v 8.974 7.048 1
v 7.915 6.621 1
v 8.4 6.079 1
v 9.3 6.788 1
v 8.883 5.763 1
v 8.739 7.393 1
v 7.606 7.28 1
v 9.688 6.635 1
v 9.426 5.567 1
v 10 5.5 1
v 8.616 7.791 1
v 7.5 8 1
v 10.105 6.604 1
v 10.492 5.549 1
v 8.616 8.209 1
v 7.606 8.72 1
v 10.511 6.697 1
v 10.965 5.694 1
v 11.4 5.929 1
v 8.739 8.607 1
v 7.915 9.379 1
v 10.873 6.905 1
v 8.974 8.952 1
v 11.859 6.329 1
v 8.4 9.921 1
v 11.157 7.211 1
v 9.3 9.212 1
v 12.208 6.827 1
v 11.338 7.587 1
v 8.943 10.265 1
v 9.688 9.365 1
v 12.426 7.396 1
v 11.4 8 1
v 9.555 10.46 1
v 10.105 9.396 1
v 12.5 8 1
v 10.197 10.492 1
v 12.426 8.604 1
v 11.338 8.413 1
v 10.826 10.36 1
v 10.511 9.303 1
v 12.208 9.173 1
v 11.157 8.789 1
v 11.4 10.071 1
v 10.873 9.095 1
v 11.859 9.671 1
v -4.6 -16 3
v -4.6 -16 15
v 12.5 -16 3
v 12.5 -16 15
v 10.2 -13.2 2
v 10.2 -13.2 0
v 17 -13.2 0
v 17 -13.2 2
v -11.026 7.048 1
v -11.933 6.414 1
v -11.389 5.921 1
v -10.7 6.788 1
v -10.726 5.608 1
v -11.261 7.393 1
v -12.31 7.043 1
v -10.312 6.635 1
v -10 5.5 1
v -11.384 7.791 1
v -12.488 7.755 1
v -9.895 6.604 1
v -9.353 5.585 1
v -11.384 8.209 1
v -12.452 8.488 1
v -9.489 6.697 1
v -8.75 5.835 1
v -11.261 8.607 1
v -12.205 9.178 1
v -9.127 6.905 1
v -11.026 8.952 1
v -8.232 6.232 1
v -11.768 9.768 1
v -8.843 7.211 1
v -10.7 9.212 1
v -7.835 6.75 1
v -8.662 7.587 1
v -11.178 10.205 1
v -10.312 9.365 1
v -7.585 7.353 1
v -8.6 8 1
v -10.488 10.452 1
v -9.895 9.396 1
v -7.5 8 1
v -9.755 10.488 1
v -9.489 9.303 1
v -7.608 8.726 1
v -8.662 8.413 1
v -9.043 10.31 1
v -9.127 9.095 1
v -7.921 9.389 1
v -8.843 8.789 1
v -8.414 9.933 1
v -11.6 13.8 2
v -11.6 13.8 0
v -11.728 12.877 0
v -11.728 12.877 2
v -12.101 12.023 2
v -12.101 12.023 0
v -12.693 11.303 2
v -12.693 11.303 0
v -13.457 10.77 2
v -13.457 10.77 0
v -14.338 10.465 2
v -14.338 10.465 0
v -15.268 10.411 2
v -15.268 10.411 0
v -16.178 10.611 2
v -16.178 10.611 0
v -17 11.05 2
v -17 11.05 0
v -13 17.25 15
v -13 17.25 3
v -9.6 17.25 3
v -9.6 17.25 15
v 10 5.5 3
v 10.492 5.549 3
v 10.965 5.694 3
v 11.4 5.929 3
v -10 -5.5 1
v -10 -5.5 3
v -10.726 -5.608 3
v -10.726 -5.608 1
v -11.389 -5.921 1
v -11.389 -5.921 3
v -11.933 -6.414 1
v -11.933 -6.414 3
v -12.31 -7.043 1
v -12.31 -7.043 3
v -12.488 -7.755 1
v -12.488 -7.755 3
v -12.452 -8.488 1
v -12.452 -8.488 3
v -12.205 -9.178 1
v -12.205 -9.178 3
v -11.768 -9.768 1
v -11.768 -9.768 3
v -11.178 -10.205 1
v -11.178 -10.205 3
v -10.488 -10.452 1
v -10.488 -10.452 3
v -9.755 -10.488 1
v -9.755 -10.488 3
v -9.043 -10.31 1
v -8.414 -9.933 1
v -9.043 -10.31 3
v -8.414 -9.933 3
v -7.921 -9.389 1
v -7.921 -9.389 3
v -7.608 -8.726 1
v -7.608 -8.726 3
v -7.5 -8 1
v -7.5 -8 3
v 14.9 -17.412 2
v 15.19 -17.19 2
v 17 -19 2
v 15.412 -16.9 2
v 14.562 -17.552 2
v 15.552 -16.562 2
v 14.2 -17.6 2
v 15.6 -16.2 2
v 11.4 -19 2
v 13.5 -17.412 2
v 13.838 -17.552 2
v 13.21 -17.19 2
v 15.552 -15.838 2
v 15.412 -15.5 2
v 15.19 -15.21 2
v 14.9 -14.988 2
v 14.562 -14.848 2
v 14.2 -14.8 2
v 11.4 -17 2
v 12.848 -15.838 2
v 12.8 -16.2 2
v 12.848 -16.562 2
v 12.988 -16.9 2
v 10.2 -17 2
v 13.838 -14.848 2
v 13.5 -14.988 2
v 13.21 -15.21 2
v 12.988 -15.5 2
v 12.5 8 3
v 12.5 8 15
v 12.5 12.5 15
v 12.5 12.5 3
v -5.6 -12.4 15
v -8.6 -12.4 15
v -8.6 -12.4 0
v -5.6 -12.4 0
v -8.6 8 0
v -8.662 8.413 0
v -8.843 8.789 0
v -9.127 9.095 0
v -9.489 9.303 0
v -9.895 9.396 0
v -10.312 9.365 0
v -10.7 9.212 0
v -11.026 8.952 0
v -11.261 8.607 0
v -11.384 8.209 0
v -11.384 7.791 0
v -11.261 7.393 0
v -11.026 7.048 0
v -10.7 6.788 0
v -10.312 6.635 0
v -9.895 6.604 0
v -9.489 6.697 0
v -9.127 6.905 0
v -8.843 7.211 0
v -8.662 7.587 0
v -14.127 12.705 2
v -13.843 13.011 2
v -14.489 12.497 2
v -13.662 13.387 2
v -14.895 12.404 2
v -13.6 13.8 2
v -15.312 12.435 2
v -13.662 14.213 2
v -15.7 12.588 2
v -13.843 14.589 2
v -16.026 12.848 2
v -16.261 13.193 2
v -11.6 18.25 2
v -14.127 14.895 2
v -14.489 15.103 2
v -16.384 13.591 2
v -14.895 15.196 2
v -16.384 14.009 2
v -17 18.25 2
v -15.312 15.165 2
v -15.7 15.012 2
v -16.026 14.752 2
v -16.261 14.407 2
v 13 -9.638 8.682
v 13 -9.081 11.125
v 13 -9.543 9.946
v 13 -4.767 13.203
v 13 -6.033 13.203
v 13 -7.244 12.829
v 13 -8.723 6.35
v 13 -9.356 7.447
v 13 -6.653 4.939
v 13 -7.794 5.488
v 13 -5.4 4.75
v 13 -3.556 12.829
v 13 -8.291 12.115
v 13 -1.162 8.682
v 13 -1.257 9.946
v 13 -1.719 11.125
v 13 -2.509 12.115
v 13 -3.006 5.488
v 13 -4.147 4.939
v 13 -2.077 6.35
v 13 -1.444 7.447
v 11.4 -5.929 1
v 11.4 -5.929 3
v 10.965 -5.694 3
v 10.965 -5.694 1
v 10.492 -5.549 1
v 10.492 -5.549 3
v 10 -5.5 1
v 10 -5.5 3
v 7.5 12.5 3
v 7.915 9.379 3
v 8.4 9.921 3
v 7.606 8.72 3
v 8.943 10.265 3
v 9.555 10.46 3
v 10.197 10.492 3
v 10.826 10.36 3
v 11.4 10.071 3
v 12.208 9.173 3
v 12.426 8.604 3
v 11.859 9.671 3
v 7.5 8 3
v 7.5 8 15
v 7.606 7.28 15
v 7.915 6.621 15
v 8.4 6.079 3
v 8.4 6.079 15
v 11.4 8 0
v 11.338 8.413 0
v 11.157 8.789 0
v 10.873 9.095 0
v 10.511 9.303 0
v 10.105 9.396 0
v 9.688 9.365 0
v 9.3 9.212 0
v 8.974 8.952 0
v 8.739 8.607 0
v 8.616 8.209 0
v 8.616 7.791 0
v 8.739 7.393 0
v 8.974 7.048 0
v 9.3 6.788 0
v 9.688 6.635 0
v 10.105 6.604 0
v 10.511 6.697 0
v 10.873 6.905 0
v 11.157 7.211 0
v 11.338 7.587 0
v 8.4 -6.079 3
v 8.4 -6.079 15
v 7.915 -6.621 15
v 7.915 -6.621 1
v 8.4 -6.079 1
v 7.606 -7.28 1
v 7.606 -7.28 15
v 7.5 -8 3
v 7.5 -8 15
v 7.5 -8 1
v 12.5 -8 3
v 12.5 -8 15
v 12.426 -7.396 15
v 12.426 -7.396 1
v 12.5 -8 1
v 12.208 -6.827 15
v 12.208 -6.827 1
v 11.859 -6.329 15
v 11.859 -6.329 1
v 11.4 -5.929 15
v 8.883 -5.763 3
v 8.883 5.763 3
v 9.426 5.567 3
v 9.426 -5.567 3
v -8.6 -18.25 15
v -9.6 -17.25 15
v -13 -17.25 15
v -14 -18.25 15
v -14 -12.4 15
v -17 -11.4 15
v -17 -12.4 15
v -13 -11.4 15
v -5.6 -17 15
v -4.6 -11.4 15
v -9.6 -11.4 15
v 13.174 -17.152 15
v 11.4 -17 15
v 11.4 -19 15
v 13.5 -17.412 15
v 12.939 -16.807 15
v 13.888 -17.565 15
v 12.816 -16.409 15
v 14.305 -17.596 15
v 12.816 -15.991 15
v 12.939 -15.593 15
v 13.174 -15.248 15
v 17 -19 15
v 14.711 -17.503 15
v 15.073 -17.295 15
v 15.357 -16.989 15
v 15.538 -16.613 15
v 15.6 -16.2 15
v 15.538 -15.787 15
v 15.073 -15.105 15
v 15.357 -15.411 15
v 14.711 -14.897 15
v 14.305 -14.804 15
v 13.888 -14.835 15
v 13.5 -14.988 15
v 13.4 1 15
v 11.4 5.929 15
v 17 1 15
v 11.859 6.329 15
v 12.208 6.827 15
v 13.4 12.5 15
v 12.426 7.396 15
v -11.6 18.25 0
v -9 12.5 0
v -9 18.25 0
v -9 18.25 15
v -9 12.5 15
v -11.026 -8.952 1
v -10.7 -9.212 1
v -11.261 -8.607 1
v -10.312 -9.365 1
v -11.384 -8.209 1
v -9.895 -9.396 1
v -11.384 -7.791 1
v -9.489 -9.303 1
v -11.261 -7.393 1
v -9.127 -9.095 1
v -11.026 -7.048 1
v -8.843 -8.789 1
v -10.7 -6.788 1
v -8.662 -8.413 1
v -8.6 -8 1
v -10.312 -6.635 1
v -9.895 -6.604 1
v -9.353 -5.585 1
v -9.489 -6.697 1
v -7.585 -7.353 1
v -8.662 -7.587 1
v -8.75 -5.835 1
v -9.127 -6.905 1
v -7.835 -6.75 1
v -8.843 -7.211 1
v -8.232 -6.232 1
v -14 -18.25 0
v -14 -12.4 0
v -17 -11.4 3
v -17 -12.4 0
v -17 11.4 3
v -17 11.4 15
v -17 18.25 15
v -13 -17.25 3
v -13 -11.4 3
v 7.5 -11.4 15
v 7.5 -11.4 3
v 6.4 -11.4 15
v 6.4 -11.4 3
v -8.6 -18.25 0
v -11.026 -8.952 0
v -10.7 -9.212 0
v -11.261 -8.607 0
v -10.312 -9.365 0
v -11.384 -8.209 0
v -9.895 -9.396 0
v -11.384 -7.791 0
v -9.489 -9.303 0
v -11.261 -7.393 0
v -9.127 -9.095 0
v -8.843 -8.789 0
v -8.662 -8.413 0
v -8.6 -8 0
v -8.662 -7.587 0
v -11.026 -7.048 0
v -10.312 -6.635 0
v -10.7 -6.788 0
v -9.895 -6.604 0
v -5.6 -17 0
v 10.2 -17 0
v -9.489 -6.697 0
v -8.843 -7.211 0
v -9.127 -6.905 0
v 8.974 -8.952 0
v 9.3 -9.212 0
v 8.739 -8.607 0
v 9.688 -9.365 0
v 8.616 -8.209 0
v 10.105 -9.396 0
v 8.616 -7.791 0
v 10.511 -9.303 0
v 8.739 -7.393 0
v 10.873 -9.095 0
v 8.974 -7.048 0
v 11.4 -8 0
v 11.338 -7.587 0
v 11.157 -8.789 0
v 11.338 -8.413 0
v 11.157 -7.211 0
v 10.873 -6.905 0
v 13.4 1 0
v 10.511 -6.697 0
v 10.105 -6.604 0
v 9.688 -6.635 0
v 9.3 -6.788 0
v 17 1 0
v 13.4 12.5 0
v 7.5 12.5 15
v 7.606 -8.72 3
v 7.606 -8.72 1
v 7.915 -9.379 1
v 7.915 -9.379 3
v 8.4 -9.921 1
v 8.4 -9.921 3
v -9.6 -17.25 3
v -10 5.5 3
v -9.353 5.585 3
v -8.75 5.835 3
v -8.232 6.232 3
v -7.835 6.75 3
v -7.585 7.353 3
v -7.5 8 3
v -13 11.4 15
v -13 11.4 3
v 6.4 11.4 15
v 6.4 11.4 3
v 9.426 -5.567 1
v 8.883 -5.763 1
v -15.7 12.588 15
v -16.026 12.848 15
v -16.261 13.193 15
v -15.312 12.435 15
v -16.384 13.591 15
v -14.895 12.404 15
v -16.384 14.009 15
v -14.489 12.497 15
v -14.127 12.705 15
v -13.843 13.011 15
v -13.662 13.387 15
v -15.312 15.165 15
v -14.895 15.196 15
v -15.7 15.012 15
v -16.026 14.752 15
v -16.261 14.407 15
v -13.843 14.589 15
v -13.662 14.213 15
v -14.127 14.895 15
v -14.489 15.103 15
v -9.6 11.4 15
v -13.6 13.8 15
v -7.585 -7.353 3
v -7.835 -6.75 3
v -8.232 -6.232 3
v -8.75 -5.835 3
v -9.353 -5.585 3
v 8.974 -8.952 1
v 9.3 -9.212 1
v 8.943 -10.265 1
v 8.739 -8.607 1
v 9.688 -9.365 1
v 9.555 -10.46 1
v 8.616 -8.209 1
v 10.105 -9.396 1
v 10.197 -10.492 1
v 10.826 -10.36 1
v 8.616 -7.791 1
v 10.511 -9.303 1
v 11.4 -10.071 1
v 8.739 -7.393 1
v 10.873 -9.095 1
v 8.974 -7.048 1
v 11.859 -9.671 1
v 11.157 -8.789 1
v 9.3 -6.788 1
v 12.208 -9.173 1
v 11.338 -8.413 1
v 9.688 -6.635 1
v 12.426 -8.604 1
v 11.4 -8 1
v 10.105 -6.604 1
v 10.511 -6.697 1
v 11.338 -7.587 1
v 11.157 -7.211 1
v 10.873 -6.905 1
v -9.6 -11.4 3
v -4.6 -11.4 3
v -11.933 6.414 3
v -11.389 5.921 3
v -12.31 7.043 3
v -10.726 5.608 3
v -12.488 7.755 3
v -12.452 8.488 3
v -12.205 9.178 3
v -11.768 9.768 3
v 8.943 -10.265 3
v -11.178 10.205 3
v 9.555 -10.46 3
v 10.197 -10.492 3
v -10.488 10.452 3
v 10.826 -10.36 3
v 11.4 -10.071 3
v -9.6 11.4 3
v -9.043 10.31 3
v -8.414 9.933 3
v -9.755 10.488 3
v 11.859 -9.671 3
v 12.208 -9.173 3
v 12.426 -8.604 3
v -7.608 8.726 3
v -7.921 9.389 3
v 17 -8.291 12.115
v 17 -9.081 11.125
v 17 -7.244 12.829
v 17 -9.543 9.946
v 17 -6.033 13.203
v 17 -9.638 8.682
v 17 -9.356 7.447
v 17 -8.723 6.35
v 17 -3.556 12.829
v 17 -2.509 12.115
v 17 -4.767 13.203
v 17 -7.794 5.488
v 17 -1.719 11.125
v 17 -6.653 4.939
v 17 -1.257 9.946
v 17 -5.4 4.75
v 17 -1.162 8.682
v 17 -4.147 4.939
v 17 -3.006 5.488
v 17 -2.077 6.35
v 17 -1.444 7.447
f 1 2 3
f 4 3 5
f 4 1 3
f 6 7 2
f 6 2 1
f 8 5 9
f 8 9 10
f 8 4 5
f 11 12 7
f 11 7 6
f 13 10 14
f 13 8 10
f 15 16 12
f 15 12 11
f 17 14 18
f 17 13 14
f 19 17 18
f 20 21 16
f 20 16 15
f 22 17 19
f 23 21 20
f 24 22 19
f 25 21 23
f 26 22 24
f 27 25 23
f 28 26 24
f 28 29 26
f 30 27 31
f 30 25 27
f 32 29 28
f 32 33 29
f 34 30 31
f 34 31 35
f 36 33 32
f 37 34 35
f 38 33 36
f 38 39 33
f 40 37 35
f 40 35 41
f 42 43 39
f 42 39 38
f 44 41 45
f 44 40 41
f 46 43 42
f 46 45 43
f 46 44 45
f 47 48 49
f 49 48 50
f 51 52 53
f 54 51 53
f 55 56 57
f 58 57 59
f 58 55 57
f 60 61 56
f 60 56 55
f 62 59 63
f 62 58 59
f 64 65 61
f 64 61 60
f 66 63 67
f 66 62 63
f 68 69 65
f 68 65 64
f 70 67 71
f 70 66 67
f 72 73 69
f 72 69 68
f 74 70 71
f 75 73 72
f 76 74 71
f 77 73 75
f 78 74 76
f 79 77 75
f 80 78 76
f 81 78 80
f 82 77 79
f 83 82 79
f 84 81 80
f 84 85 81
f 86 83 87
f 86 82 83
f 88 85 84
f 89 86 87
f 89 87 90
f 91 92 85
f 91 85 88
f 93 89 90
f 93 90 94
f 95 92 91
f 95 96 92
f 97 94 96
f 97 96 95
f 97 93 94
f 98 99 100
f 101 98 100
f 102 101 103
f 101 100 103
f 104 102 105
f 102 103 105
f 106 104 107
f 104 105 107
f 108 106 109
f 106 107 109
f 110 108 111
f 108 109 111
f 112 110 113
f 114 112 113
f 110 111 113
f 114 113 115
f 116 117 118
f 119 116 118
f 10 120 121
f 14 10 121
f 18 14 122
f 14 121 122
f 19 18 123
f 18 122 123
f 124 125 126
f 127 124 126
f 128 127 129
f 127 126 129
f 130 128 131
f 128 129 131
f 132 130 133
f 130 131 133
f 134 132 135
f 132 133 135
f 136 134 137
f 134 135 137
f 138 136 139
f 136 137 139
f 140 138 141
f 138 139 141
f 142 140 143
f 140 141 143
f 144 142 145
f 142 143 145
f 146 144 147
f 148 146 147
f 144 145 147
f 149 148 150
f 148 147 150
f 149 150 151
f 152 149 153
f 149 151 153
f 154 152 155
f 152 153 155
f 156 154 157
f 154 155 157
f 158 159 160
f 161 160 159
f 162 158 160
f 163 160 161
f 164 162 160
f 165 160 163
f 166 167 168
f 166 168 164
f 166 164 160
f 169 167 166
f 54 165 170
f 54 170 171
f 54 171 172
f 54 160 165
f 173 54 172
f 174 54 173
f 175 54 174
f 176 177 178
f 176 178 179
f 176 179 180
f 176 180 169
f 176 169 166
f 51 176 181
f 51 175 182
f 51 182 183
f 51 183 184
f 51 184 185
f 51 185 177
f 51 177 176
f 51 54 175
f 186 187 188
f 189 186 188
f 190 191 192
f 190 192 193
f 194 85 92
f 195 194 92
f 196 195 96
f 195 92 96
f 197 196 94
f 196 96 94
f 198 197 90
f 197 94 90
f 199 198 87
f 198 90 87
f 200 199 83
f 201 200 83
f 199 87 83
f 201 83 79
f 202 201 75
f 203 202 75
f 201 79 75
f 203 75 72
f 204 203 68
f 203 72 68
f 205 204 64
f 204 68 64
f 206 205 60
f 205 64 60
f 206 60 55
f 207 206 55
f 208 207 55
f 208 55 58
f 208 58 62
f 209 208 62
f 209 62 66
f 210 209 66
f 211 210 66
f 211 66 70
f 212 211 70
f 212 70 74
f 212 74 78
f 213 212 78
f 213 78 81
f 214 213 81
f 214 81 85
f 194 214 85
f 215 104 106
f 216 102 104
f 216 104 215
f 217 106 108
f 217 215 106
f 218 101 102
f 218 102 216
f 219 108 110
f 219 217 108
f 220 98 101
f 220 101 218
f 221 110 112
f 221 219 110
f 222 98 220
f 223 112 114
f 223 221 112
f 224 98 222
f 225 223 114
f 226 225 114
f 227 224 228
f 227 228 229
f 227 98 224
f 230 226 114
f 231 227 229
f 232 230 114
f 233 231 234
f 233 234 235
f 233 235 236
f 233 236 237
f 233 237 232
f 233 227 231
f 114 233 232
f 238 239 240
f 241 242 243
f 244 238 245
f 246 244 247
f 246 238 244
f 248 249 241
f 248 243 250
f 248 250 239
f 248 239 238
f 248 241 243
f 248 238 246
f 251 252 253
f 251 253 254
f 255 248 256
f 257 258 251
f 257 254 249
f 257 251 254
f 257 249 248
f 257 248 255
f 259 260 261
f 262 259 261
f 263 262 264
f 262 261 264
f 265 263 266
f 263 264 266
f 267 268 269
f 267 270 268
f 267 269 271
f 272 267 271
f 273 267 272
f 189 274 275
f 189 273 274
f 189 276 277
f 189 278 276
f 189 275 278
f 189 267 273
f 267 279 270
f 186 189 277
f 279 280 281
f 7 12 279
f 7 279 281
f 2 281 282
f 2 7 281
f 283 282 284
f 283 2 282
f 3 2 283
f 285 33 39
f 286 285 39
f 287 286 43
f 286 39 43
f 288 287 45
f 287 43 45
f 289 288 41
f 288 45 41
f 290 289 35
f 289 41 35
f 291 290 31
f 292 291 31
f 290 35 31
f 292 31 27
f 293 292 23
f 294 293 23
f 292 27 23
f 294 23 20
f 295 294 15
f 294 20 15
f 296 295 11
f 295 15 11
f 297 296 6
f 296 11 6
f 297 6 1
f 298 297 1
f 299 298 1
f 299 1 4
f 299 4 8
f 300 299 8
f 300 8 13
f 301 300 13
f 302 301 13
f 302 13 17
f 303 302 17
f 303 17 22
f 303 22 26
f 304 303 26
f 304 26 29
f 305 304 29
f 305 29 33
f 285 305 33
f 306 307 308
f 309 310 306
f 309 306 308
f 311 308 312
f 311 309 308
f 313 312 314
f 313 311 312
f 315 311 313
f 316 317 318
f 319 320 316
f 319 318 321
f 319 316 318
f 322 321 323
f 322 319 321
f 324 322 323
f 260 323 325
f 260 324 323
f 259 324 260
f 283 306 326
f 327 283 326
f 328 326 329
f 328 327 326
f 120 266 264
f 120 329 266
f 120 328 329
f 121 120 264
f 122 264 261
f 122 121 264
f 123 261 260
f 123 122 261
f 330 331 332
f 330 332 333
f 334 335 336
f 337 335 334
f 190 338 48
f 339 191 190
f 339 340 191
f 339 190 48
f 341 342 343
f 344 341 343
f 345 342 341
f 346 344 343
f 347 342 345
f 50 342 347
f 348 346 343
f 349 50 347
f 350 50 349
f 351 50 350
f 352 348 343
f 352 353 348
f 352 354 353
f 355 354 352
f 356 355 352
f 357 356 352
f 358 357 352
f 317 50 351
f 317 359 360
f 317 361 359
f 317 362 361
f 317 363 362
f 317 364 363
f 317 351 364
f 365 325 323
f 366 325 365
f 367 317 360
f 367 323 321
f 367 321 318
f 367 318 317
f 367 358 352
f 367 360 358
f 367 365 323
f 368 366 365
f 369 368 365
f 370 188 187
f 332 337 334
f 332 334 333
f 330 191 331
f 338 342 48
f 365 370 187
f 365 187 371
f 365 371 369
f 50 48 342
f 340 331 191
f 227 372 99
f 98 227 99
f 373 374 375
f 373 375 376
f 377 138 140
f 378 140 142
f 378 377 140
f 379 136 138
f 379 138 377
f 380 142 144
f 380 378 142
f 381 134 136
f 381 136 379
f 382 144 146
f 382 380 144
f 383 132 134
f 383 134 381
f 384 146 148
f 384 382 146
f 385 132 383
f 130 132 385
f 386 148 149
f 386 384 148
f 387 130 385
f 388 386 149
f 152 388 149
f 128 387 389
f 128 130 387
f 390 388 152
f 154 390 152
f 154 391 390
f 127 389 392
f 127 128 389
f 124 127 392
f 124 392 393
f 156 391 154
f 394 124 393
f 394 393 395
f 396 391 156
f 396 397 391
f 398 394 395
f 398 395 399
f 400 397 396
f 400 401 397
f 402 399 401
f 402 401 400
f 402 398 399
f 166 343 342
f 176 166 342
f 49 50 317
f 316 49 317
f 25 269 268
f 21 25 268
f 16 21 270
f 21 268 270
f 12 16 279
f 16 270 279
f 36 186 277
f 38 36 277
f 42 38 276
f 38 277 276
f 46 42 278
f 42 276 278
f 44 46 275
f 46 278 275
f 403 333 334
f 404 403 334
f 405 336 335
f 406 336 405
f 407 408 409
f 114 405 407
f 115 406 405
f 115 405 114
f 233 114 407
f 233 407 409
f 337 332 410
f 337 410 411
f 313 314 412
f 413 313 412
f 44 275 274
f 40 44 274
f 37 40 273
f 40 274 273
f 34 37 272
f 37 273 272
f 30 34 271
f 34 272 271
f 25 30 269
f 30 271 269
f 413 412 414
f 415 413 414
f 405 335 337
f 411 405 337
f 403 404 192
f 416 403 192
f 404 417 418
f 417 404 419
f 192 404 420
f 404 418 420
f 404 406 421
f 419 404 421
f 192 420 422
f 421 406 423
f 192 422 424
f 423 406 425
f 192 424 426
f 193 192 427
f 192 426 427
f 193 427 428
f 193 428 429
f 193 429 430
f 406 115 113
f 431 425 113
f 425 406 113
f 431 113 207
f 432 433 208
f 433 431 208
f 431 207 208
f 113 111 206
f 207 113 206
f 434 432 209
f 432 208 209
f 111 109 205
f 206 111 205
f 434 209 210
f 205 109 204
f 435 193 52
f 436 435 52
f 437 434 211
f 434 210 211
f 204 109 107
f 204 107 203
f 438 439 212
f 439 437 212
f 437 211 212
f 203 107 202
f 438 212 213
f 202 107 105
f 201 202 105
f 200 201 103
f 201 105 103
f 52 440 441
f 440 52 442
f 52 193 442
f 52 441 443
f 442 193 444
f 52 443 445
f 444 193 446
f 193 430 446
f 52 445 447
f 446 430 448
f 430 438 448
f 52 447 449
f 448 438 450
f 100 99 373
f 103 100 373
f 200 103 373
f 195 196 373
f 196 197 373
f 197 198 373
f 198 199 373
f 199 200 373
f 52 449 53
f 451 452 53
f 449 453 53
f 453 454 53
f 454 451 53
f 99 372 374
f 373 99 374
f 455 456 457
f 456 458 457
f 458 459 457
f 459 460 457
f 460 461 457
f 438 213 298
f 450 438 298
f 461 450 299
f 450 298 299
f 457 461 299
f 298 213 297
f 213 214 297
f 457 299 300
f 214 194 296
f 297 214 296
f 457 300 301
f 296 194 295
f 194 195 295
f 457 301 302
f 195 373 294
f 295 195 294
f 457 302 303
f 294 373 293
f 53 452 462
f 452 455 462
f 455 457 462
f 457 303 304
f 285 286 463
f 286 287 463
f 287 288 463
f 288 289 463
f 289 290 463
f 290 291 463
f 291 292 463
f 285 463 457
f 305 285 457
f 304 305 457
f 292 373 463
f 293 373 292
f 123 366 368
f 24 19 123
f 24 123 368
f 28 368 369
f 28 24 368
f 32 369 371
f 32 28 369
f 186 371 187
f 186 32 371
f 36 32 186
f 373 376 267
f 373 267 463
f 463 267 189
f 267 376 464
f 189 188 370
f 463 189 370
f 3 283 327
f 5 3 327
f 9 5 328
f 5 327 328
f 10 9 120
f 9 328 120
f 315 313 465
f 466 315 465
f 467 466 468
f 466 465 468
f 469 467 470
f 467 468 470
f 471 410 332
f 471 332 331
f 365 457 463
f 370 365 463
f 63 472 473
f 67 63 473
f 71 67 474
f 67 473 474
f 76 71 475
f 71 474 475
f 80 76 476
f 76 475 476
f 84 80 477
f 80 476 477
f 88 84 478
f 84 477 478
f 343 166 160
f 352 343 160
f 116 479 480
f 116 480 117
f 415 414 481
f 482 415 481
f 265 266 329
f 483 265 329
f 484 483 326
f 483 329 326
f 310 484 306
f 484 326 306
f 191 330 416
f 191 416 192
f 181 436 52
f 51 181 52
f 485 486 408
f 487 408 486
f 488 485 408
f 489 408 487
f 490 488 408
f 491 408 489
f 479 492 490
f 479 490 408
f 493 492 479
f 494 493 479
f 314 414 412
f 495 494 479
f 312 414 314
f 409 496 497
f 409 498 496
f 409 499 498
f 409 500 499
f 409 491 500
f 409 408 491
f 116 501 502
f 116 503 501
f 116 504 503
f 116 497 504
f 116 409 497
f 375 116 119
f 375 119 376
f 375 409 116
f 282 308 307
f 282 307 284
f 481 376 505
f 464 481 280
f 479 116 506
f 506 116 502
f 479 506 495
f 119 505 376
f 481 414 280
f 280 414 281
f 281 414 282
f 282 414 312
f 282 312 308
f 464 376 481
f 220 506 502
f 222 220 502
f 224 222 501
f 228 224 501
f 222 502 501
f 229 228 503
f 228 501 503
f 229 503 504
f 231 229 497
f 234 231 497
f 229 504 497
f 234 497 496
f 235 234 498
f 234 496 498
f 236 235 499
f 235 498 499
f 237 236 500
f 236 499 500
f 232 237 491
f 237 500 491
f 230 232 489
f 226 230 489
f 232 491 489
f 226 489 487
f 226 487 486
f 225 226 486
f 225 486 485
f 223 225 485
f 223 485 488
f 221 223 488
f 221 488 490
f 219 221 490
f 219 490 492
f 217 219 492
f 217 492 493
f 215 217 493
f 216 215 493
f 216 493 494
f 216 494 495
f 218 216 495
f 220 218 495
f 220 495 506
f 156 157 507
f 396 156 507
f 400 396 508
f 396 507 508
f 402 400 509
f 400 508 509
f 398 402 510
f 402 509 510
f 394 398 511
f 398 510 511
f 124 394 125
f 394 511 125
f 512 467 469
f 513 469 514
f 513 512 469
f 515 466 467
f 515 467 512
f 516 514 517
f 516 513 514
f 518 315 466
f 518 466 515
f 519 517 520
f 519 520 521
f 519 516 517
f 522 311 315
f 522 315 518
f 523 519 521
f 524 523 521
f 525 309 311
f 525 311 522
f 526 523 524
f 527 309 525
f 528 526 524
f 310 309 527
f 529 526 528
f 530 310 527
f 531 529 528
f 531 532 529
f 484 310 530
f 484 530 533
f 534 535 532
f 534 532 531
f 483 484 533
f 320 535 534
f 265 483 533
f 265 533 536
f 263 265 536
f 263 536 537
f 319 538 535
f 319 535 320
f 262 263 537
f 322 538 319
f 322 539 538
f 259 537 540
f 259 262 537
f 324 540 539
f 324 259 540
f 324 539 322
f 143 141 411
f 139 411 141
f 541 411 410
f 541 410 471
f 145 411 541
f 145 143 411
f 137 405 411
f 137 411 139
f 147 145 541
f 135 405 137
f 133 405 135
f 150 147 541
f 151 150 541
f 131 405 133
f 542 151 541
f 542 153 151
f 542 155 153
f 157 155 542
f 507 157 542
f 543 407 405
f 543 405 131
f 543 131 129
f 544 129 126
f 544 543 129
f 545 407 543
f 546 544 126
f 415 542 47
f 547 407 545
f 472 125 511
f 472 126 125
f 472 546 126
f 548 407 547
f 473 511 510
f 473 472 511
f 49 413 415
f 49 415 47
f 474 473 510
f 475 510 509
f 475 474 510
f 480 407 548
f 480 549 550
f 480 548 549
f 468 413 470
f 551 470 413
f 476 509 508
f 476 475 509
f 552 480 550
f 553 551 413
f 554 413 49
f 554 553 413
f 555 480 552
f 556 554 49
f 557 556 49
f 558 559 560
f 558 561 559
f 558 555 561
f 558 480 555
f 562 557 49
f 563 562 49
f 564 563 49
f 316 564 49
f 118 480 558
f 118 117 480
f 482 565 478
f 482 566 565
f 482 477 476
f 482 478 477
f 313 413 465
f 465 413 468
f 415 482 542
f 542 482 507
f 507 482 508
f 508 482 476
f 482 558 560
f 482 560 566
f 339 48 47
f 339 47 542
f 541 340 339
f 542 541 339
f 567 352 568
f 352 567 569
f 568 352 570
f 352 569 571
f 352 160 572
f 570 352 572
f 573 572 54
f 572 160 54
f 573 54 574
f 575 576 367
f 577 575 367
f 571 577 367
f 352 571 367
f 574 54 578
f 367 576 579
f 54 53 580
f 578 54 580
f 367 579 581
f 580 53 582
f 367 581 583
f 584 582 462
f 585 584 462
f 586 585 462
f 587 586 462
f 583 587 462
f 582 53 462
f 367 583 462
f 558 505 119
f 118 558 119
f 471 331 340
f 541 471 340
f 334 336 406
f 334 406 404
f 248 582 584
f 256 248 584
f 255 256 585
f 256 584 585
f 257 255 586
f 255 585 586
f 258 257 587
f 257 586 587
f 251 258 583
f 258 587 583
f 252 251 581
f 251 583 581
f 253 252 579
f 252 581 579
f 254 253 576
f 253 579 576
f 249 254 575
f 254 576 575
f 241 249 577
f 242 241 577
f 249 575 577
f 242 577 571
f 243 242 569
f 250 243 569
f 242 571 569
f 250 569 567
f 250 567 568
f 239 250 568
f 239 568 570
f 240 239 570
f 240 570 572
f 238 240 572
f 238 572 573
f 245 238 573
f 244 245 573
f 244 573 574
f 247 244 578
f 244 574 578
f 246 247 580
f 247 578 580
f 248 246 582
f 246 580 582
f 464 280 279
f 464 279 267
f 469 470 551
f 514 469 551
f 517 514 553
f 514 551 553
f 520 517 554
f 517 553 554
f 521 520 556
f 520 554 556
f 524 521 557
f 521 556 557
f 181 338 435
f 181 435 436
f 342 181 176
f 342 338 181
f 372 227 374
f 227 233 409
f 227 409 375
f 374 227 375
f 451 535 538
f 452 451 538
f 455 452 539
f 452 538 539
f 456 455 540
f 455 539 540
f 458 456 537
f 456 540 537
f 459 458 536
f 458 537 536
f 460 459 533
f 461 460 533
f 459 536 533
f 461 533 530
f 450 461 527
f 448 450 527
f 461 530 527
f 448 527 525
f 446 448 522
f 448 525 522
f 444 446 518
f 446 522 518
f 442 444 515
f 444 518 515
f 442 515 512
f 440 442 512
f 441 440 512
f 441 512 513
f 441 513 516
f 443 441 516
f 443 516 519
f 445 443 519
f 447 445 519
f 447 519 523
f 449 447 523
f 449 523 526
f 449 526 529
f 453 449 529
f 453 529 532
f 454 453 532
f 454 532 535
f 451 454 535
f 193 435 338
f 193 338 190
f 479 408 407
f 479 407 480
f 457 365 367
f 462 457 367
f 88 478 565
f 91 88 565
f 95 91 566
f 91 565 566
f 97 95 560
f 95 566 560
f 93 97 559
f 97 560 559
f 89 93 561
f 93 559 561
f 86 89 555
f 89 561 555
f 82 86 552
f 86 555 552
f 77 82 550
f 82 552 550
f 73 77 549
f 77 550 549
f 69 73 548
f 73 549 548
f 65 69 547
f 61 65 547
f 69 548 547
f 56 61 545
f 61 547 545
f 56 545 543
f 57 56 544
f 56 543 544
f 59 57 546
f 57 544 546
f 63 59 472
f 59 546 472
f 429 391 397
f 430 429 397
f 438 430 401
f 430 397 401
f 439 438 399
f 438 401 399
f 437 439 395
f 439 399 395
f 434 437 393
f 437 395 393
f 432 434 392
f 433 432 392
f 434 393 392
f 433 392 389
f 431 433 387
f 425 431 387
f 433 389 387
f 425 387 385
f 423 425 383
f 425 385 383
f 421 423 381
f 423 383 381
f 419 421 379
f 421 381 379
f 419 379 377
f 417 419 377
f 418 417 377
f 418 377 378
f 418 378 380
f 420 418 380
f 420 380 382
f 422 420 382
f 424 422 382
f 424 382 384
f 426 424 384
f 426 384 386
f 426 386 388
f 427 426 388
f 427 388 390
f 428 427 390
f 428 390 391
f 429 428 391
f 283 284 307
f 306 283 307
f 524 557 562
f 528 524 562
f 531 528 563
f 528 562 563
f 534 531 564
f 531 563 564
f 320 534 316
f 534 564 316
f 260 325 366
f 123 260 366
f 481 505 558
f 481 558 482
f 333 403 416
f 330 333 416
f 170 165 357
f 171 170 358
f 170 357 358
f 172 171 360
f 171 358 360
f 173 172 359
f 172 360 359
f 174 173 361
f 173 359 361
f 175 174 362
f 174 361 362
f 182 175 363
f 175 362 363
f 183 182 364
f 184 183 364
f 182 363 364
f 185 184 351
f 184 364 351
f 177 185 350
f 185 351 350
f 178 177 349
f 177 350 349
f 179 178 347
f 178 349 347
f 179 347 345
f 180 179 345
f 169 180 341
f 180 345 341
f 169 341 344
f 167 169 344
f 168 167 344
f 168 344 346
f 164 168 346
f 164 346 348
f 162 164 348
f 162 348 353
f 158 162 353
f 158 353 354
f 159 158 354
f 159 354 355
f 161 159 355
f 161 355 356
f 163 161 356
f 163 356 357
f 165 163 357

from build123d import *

# Parameters (mm, degrees)
SKETCH1_W                = 34
SKETCH1_H                = 38
BOSS_EXTRUDE1_DEPTH      = 16
SKETCH2_W                = 22.4
SKETCH2_H                = 22.8
SKETCH2_W_2              = 2.4
SKETCH2_H_2              = 4.85
CUT_EXTRUDE1_DEPTH       = 13
SKETCH3_W                = 10
SKETCH3_H                = 4.6
SKETCH3_W_2              = 3
CUT_EXTRUDE2_DEPTH       = 13
SKETCH4_R                = 1.4
CUT_EXTRUDE3_DEPTH       = 17
CUT_EXTRUDE5_DEPTH       = 2
SKETCH7_W                = 34
SKETCH7_H                = 1
CUT_EXTRUDE6_DEPTH       = 39
SKETCH9_W                = 8
SKETCH9_H                = 0.75
SKETCH9_W_2              = 5
SKETCH9_H_2              = 6.5
SKETCH9_W_3              = 3.6
SKETCH9_H_3              = 11.5
SKETCH9_W_4              = 17
SKETCH9_H_4              = 2
SKETCH9_W_5              = 3
SKETCH9_H_5              = 6.6
SKETCH9_W_6              = 5.4
CUT_EXTRUDE9_DEPTH       = 16
CUT_EXTRUDE10_DEPTH      = 13
CUT_EXTRUDE10_DEPTH_BACK = 2
SKETCH11_W               = 5
SKETCH11_H               = 4.5
CUT_EXTRUDE11_DEPTH      = 12
SKETCH12_W               = 1
SKETCH12_H               = 4.85
SKETCH12_H_2             = 22.8
CUT_EXTRUDE12_DEPTH      = 12
SKETCH14_R               = 4.25
CUT_EXTRUDE13_DEPTH      = 4
SKETCH17_W               = 3.4
SKETCH17_H               = 1
CUT_EXTRUDE16_DEPTH      = 12
SKETCH18_R               = 1.4
CUT_EXTRUDE17_DEPTH      = 12


with BuildPart() as part:
    # Sketch1 → Boss-Extrude1 (new body)
    with BuildSketch(Plane.XY):
        Rectangle(SKETCH1_W, SKETCH1_H)
    extrude(amount=BOSS_EXTRUDE1_DEPTH)

    # Sketch2 → Cut-Extrude1 (cut)
    with BuildSketch(Plane.XY.offset(16)):
        with Locations((-5.8, 0)):
            Rectangle(SKETCH2_W, SKETCH2_H)
        with Locations((-11.8, -13.825)):
            Rectangle(SKETCH2_W_2, SKETCH2_H_2)
        with Locations((-11.8, 13.825)):
            Rectangle(SKETCH2_W_2, SKETCH2_H_2)
    extrude(amount=-CUT_EXTRUDE1_DEPTH, mode=Mode.SUBTRACT)

    # Sketch3 → Cut-Extrude2 (cut)
    with BuildSketch(Plane.XY.offset(16)):
        Polygon((8.4, 19), (8.4, -11.4), (8.4, -16), (11.4, -16), (11.4, 19), align=None)
        with Locations((0.4, -13.7)):
            Rectangle(SKETCH3_W, SKETCH3_H)
        with Locations((6.9, -13.7)):
            Rectangle(SKETCH3_W_2, SKETCH3_H)
    extrude(amount=-CUT_EXTRUDE2_DEPTH, mode=Mode.SUBTRACT)

    # Sketch4 → Cut-Extrude3 (cut, through all)
    with BuildSketch(Plane.XY.offset(16)):
        with Locations((-15, 13.8)):
            Circle(SKETCH4_R)
        with Locations((14.2, -16.2)):
            Circle(SKETCH4_R)
    extrude(amount=-CUT_EXTRUDE3_DEPTH, mode=Mode.SUBTRACT)

    # Sketch5 → Cut-Extrude5 (cut)
    with BuildSketch(Plane(origin=(0, 0, 0), x_dir=(-1, 0, 0), z_dir=(0, 0, -1))):
        with BuildLine():
            Line((-14.2, -19), (-13.122967039, -19))
            ThreePointArc((-13.122967039, -19), (-11.727036304, -17.898367027), (-11.2, -16.2))
            ThreePointArc((-11.2, -16.2), (-12.078679656, -14.078679656), (-14.2, -13.2))
            Line((-14.2, -13.2), (-14.2, -14.8))
            ThreePointArc((-14.2, -14.8), (-13.210050506, -15.210050506), (-12.8, -16.2))
            ThreePointArc((-12.8, -16.2), (-13.210050506, -17.189949494), (-14.2, -17.6))
            Line((-14.2, -17.6), (-14.2, -19))
        make_face()
        with BuildLine():
            Line((-14.2, -14.8), (-14.2, -13.2))
            ThreePointArc((-14.2, -13.2), (-15.898367027, -13.727036304), (-17, -15.122967039))
            Line((-17, -15.122967039), (-17, -17.277032961))
            ThreePointArc((-17, -17.277032961), (-16.321320344, -18.321320344), (-15.277032961, -19))
            Line((-15.277032961, -19), (-14.2, -19))
            Line((-14.2, -19), (-14.2, -17.6))
            ThreePointArc((-14.2, -17.6), (-15.6, -16.2), (-14.2, -14.8))
        make_face()
        with BuildLine():
            Line((-17, -19), (-15.277032961, -19))
            ThreePointArc((-15.277032961, -19), (-16.321320344, -18.321320344), (-17, -17.277032961))
            Line((-17, -17.277032961), (-17, -19))
        make_face()
        with BuildLine():
            Line((-14.2, -13.2), (-17, -13.2))
            Line((-17, -13.2), (-17, -15.122967039))
            ThreePointArc((-17, -15.122967039), (-15.898367027, -13.727036304), (-14.2, -13.2))
        make_face()
        with BuildLine():
            Line((-17, -17.277032961), (-17, -15.122967039))
            ThreePointArc((-17, -15.122967039), (-17.2, -16.2), (-17, -17.277032961))
        make_face()
        with BuildLine():
            ThreePointArc((-14.2, -19.2), (-13.652277442, -19.149576241), (-13.122967039, -19))
            Line((-13.122967039, -19), (-14.2, -19))
            Line((-14.2, -19), (-14.2, -19.2))
        make_face()
        with BuildLine():
            ThreePointArc((-15.277032961, -19), (-14.747722558, -19.149576241), (-14.2, -19.2))
            Line((-14.2, -19.2), (-14.2, -19))
            Line((-14.2, -19), (-15.277032961, -19))
        make_face()
        with BuildLine():
            Line((-17, -19.2), (-14.2, -19.2))
            ThreePointArc((-14.2, -19.2), (-14.747722558, -19.149576241), (-15.277032961, -19))
            Line((-15.277032961, -19), (-17, -19))
            Line((-17, -19), (-17, -19.2))
        make_face()
        with BuildLine():
            ThreePointArc((-14.2, -19.2), (-13.652277442, -19.149576241), (-13.122967039, -19))
            Line((-13.122967039, -19), (-14.2, -19))
            Line((-14.2, -19), (-14.2, -19.2))
        make_face()
        with BuildLine():
            ThreePointArc((-15.277032961, -19), (-14.747722558, -19.149576241), (-14.2, -19.2))
            Line((-14.2, -19.2), (-14.2, -19))
            Line((-14.2, -19), (-15.277032961, -19))
        make_face()
        with BuildLine():
            ThreePointArc((17, 16.549545417), (18.029851482, 15.342724862), (18.4, 13.8))
            Line((18.4, 13.8), (18.4, 19))
            Line((18.4, 19), (17, 19))
            Line((17, 19), (17, 16.549545417))
        make_face()
        with BuildLine():
            ThreePointArc((11.6, 13.8), (13.457275138, 16.829851482), (17, 16.549545417))
            Line((17, 16.549545417), (17, 19))
            Line((17, 19), (11.6, 19))
            Line((11.6, 19), (11.6, 13.8))
        make_face()
        with BuildLine():
            Line((17, 11.050454583), (17, 13.8))
            Line((17, 13.8), (16.4, 13.8))
            ThreePointArc((16.4, 13.8), (15, 12.4), (13.6, 13.8))
            Line((13.6, 13.8), (11.6, 13.8))
            ThreePointArc((11.6, 13.8), (13.457275138, 10.770148518), (17, 11.050454583))
        make_face()
        with BuildLine():
            Line((16.4, 13.8), (17, 13.8))
            Line((17, 13.8), (17, 16.549545417))
            ThreePointArc((17, 16.549545417), (13.457275138, 16.829851482), (11.6, 13.8))
            Line((11.6, 13.8), (13.6, 13.8))
            ThreePointArc((13.6, 13.8), (15, 15.2), (16.4, 13.8))
        make_face()
        with BuildLine():
            ThreePointArc((17, 11.050454583), (18.029851482, 12.257275138), (18.4, 13.8))
            Line((18.4, 13.8), (17, 13.8))
            Line((17, 13.8), (17, 11.050454583))
        make_face()
        with BuildLine():
            Line((17, 13.8), (18.4, 13.8))
            ThreePointArc((18.4, 13.8), (18.029851482, 15.342724862), (17, 16.549545417))
            Line((17, 16.549545417), (17, 13.8))
        make_face()
        with BuildLine():
            ThreePointArc((17, 11.050454583), (18.029851482, 12.257275138), (18.4, 13.8))
            Line((18.4, 13.8), (17, 13.8))
            Line((17, 13.8), (17, 11.050454583))
        make_face()
        with BuildLine():
            Line((17, 13.8), (18.4, 13.8))
            ThreePointArc((18.4, 13.8), (18.029851482, 15.342724862), (17, 16.549545417))
            Line((17, 16.549545417), (17, 13.8))
        make_face()
        with BuildLine():
            Line((17, 11.050454583), (17, 13.8))
            Line((17, 13.8), (16.4, 13.8))
            ThreePointArc((16.4, 13.8), (15, 12.4), (13.6, 13.8))
            Line((13.6, 13.8), (11.6, 13.8))
            ThreePointArc((11.6, 13.8), (13.457275138, 10.770148518), (17, 11.050454583))
        make_face()
        with BuildLine():
            Line((16.4, 13.8), (17, 13.8))
            Line((17, 13.8), (17, 16.549545417))
            ThreePointArc((17, 16.549545417), (13.457275138, 16.829851482), (11.6, 13.8))
            Line((11.6, 13.8), (13.6, 13.8))
            ThreePointArc((13.6, 13.8), (15, 15.2), (16.4, 13.8))
        make_face()
        with BuildLine():
            Line((-13.122967039, -19), (-10.2, -19))
            Line((-10.2, -19), (-10.2, -13.2))
            Line((-10.2, -13.2), (-14.2, -13.2))
            ThreePointArc((-14.2, -13.2), (-12.078679656, -14.078679656), (-11.2, -16.2))
            ThreePointArc((-11.2, -16.2), (-11.727036304, -17.898367027), (-13.122967039, -19))
        make_face()
    extrude(amount=-CUT_EXTRUDE5_DEPTH, mode=Mode.SUBTRACT)

    # Sketch7 → Cut-Extrude6 (cut, through all)
    with BuildSketch(Plane(origin=(0, 19, 0), x_dir=(1, 0, 0), z_dir=(0, 1, 0))):
        with Locations((0, -15.5)):
            Rectangle(SKETCH7_W, SKETCH7_H)
    extrude(amount=-CUT_EXTRUDE6_DEPTH, mode=Mode.SUBTRACT)

    # Sketch9 → Cut-Extrude9 (cut, through all)
    with BuildSketch(Plane.XY.offset(15)):
        Polygon((8.4, 19), (-9, 19), (-9, 18.25), (-9, 12.5), (8.4, 12.5), align=None)
        with Locations((-13, 18.625)):
            Rectangle(SKETCH9_W, SKETCH9_H)
        with Locations((10.9, 15.75)):
            Rectangle(SKETCH9_W_2, SKETCH9_H_2)
        with Locations((15.2, 15.75)):
            Rectangle(SKETCH9_W_3, SKETCH9_H_2)
        with Locations((15.2, 6.75)):
            Rectangle(SKETCH9_W_3, SKETCH9_H_3)
        with Locations((2.9, -18)):
            Rectangle(SKETCH9_W_4, SKETCH9_H_4)
        with Locations((-7.1, -15.7)):
            Rectangle(SKETCH9_W_5, SKETCH9_H_5)
        with Locations((-11.3, -18.625)):
            Rectangle(SKETCH9_W_6, SKETCH9_H)
        with Locations((-15.5, -15.7)):
            Rectangle(SKETCH9_W_5, SKETCH9_H_5)
    extrude(amount=-CUT_EXTRUDE9_DEPTH, mode=Mode.SUBTRACT)

    # Sketch10 → Cut-Extrude10 (cut, two sides)
    with BuildSketch(Plane.XY.offset(3)) as cut_extrude10_sk:
        with BuildLine():
            Line((-10, 5.5), (-10, 8))
            Line((-10, 8), (-7.5, 8))
            ThreePointArc((-7.5, 8), (-11.767766953, 9.767766953), (-10, 5.5))
        make_face()
        with BuildLine():
            Line((-7.5, 8), (-10, 8))
            Line((-10, 8), (-10, 5.5))
            ThreePointArc((-10, 5.5), (-8.232233047, 6.232233047), (-7.5, 8))
        make_face()
        with BuildLine():
            Line((-10, 5.5), (-10, 8))
            Line((-10, 8), (-7.5, 8))
            ThreePointArc((-7.5, 8), (-11.767766953, 9.767766953), (-10, 5.5))
        make_face()
        with BuildLine():
            Line((-7.5, 8), (-10, 8))
            Line((-10, 8), (-10, 5.5))
            ThreePointArc((-10, 5.5), (-8.232233047, 6.232233047), (-7.5, 8))
        make_face()
        with BuildLine():
            Line((10, 8), (8.4, 8))
            Line((8.4, 8), (8.4, 6.079062729))
            ThreePointArc((8.4, 6.079062729), (9.149218941, 5.649218941), (10, 5.5))
            Line((10, 5.5), (10, 8))
        make_face()
        with BuildLine():
            Line((8.4, 9.920937271), (8.4, 8))
            Line((8.4, 8), (10, 8))
            Line((10, 8), (10, 5.5))
            ThreePointArc((10, 5.5), (10.732093302, 5.609594303), (11.4, 5.928768482))
            Line((11.4, 5.928768482), (11.4, 10.071231518))
            ThreePointArc((11.4, 10.071231518), (9.874911671, 10.496868621), (8.4, 9.920937271))
        make_face()
        with BuildLine():
            ThreePointArc((12.5, 8), (12.207940217, 9.17260394), (11.4, 10.071231518))
            Line((11.4, 10.071231518), (11.4, 5.928768482))
            ThreePointArc((11.4, 5.928768482), (12.207940217, 6.82739606), (12.5, 8))
        make_face()
        with BuildLine():
            ThreePointArc((8.4, 9.920937271), (7.736153715, 9.060660172), (7.5, 8))
            Line((7.5, 8), (8.4, 8))
            Line((8.4, 8), (8.4, 9.920937271))
        make_face()
        with BuildLine():
            Line((8.4, 8), (7.5, 8))
            ThreePointArc((7.5, 8), (7.736153715, 6.939339828), (8.4, 6.079062729))
            Line((8.4, 6.079062729), (8.4, 8))
        make_face()
        with BuildLine():
            ThreePointArc((8.4, 9.920937271), (7.736153715, 9.060660172), (7.5, 8))
            Line((7.5, 8), (8.4, 8))
            Line((8.4, 8), (8.4, 9.920937271))
        make_face()
        with BuildLine():
            Line((8.4, 8), (7.5, 8))
            ThreePointArc((7.5, 8), (7.736153715, 6.939339828), (8.4, 6.079062729))
            Line((8.4, 6.079062729), (8.4, 8))
        make_face()
        with BuildLine():
            ThreePointArc((-7.5, -8), (-8.232233047, -6.232233047), (-10, -5.5))
            Line((-10, -5.5), (-10, -8))
            Line((-10, -8), (-7.5, -8))
        make_face()
        with BuildLine():
            Line((-10, -8), (-10, -5.5))
            ThreePointArc((-10, -5.5), (-11.767766953, -9.767766953), (-7.5, -8))
            Line((-7.5, -8), (-10, -8))
        make_face()
        with BuildLine():
            ThreePointArc((-7.5, -8), (-8.232233047, -6.232233047), (-10, -5.5))
            Line((-10, -5.5), (-10, -8))
            Line((-10, -8), (-7.5, -8))
        make_face()
        with BuildLine():
            Line((-10, -8), (-10, -5.5))
            ThreePointArc((-10, -5.5), (-11.767766953, -9.767766953), (-7.5, -8))
            Line((-7.5, -8), (-10, -8))
        make_face()
        with BuildLine():
            ThreePointArc((11.4, -5.928768482), (10.732093302, -5.609594303), (10, -5.5))
            Line((10, -5.5), (10, -8))
            Line((10, -8), (8.4, -8))
            Line((8.4, -8), (8.4, -9.920937271))
            ThreePointArc((8.4, -9.920937271), (9.874911671, -10.496868621), (11.4, -10.071231518))
            Line((11.4, -10.071231518), (11.4, -5.928768482))
        make_face()
        with BuildLine():
            ThreePointArc((12.5, -8), (12.207940217, -6.82739606), (11.4, -5.928768482))
            Line((11.4, -5.928768482), (11.4, -10.071231518))
            ThreePointArc((11.4, -10.071231518), (12.207940217, -9.17260394), (12.5, -8))
        make_face()
        with BuildLine():
            ThreePointArc((10, -5.5), (9.149218941, -5.649218941), (8.4, -6.079062729))
            Line((8.4, -6.079062729), (8.4, -8))
            Line((8.4, -8), (10, -8))
            Line((10, -8), (10, -5.5))
        make_face()
        with BuildLine():
            Line((8.4, -8), (8.4, -6.079062729))
            ThreePointArc((8.4, -6.079062729), (7.736153715, -6.939339828), (7.5, -8))
            Line((7.5, -8), (8.4, -8))
        make_face()
        with BuildLine():
            Line((8.4, -8), (7.5, -8))
            ThreePointArc((7.5, -8), (7.736153715, -9.060660172), (8.4, -9.920937271))
            Line((8.4, -9.920937271), (8.4, -8))
        make_face()
        with BuildLine():
            Line((8.4, -8), (8.4, -6.079062729))
            ThreePointArc((8.4, -6.079062729), (7.736153715, -6.939339828), (7.5, -8))
            Line((7.5, -8), (8.4, -8))
        make_face()
        with BuildLine():
            Line((8.4, -8), (7.5, -8))
            ThreePointArc((7.5, -8), (7.736153715, -9.060660172), (8.4, -9.920937271))
            Line((8.4, -9.920937271), (8.4, -8))
        make_face()
    extrude(amount=CUT_EXTRUDE10_DEPTH, mode=Mode.SUBTRACT)
    extrude(cut_extrude10_sk.sketch, amount=-CUT_EXTRUDE10_DEPTH_BACK, mode=Mode.SUBTRACT)

    # Sketch11 → Cut-Extrude11 (cut)
    with BuildSketch(Plane.XY.offset(15)):
        Polygon((12.5, -8), (7.5, -8), (7.5, -11.4), (11.4, -11.4), (11.4, -16), (12.5, -16), (12.5, -11.4), align=None)
        with Locations((10, 10.25)):
            Rectangle(SKETCH11_W, SKETCH11_H)
    extrude(amount=-CUT_EXTRUDE11_DEPTH, mode=Mode.SUBTRACT)

    # Sketch12 → Cut-Extrude12 (cut)
    with BuildSketch(Plane.XY.offset(15)):
        with Locations((-10.1, 13.825)):
            Rectangle(SKETCH12_W, SKETCH12_H)
        with Locations((-10.1, -13.825)):
            Rectangle(SKETCH12_W, SKETCH12_H)
        with Locations((5.9, 0)):
            Rectangle(SKETCH12_W, SKETCH12_H_2)
    extrude(amount=-CUT_EXTRUDE12_DEPTH, mode=Mode.SUBTRACT)

    # Sketch14 → Cut-Extrude13 (cut)
    with BuildSketch(Plane(origin=(17, 0, 0), x_dir=(0, 0, -1), z_dir=(1, 0, 0))):
        with Locations((-9, -5.4)):
            Circle(SKETCH14_R)
    extrude(amount=-CUT_EXTRUDE13_DEPTH, mode=Mode.SUBTRACT)

    # Sketch17 → Cut-Extrude16 (cut)
    with BuildSketch(Plane.XY.offset(15)):
        with Locations((-11.3, 16.75)):
            Rectangle(SKETCH17_W, SKETCH17_H)
        with Locations((-11.3, -16.75)):
            Rectangle(SKETCH17_W, SKETCH17_H)
    extrude(amount=-CUT_EXTRUDE16_DEPTH, mode=Mode.SUBTRACT)

    # Sketch18 → Cut-Extrude17 (cut)
    with BuildSketch(Plane.XY.offset(1)):
        with Locations((-10, 8)):
            Circle(SKETCH18_R)
        with Locations((10, 8)):
            Circle(SKETCH18_R)
        with Locations((-10, -8)):
            Circle(SKETCH18_R)
        with Locations((10, -8)):
            Circle(SKETCH18_R)
    extrude(amount=-CUT_EXTRUDE17_DEPTH, mode=Mode.SUBTRACT)


solid = part.part
